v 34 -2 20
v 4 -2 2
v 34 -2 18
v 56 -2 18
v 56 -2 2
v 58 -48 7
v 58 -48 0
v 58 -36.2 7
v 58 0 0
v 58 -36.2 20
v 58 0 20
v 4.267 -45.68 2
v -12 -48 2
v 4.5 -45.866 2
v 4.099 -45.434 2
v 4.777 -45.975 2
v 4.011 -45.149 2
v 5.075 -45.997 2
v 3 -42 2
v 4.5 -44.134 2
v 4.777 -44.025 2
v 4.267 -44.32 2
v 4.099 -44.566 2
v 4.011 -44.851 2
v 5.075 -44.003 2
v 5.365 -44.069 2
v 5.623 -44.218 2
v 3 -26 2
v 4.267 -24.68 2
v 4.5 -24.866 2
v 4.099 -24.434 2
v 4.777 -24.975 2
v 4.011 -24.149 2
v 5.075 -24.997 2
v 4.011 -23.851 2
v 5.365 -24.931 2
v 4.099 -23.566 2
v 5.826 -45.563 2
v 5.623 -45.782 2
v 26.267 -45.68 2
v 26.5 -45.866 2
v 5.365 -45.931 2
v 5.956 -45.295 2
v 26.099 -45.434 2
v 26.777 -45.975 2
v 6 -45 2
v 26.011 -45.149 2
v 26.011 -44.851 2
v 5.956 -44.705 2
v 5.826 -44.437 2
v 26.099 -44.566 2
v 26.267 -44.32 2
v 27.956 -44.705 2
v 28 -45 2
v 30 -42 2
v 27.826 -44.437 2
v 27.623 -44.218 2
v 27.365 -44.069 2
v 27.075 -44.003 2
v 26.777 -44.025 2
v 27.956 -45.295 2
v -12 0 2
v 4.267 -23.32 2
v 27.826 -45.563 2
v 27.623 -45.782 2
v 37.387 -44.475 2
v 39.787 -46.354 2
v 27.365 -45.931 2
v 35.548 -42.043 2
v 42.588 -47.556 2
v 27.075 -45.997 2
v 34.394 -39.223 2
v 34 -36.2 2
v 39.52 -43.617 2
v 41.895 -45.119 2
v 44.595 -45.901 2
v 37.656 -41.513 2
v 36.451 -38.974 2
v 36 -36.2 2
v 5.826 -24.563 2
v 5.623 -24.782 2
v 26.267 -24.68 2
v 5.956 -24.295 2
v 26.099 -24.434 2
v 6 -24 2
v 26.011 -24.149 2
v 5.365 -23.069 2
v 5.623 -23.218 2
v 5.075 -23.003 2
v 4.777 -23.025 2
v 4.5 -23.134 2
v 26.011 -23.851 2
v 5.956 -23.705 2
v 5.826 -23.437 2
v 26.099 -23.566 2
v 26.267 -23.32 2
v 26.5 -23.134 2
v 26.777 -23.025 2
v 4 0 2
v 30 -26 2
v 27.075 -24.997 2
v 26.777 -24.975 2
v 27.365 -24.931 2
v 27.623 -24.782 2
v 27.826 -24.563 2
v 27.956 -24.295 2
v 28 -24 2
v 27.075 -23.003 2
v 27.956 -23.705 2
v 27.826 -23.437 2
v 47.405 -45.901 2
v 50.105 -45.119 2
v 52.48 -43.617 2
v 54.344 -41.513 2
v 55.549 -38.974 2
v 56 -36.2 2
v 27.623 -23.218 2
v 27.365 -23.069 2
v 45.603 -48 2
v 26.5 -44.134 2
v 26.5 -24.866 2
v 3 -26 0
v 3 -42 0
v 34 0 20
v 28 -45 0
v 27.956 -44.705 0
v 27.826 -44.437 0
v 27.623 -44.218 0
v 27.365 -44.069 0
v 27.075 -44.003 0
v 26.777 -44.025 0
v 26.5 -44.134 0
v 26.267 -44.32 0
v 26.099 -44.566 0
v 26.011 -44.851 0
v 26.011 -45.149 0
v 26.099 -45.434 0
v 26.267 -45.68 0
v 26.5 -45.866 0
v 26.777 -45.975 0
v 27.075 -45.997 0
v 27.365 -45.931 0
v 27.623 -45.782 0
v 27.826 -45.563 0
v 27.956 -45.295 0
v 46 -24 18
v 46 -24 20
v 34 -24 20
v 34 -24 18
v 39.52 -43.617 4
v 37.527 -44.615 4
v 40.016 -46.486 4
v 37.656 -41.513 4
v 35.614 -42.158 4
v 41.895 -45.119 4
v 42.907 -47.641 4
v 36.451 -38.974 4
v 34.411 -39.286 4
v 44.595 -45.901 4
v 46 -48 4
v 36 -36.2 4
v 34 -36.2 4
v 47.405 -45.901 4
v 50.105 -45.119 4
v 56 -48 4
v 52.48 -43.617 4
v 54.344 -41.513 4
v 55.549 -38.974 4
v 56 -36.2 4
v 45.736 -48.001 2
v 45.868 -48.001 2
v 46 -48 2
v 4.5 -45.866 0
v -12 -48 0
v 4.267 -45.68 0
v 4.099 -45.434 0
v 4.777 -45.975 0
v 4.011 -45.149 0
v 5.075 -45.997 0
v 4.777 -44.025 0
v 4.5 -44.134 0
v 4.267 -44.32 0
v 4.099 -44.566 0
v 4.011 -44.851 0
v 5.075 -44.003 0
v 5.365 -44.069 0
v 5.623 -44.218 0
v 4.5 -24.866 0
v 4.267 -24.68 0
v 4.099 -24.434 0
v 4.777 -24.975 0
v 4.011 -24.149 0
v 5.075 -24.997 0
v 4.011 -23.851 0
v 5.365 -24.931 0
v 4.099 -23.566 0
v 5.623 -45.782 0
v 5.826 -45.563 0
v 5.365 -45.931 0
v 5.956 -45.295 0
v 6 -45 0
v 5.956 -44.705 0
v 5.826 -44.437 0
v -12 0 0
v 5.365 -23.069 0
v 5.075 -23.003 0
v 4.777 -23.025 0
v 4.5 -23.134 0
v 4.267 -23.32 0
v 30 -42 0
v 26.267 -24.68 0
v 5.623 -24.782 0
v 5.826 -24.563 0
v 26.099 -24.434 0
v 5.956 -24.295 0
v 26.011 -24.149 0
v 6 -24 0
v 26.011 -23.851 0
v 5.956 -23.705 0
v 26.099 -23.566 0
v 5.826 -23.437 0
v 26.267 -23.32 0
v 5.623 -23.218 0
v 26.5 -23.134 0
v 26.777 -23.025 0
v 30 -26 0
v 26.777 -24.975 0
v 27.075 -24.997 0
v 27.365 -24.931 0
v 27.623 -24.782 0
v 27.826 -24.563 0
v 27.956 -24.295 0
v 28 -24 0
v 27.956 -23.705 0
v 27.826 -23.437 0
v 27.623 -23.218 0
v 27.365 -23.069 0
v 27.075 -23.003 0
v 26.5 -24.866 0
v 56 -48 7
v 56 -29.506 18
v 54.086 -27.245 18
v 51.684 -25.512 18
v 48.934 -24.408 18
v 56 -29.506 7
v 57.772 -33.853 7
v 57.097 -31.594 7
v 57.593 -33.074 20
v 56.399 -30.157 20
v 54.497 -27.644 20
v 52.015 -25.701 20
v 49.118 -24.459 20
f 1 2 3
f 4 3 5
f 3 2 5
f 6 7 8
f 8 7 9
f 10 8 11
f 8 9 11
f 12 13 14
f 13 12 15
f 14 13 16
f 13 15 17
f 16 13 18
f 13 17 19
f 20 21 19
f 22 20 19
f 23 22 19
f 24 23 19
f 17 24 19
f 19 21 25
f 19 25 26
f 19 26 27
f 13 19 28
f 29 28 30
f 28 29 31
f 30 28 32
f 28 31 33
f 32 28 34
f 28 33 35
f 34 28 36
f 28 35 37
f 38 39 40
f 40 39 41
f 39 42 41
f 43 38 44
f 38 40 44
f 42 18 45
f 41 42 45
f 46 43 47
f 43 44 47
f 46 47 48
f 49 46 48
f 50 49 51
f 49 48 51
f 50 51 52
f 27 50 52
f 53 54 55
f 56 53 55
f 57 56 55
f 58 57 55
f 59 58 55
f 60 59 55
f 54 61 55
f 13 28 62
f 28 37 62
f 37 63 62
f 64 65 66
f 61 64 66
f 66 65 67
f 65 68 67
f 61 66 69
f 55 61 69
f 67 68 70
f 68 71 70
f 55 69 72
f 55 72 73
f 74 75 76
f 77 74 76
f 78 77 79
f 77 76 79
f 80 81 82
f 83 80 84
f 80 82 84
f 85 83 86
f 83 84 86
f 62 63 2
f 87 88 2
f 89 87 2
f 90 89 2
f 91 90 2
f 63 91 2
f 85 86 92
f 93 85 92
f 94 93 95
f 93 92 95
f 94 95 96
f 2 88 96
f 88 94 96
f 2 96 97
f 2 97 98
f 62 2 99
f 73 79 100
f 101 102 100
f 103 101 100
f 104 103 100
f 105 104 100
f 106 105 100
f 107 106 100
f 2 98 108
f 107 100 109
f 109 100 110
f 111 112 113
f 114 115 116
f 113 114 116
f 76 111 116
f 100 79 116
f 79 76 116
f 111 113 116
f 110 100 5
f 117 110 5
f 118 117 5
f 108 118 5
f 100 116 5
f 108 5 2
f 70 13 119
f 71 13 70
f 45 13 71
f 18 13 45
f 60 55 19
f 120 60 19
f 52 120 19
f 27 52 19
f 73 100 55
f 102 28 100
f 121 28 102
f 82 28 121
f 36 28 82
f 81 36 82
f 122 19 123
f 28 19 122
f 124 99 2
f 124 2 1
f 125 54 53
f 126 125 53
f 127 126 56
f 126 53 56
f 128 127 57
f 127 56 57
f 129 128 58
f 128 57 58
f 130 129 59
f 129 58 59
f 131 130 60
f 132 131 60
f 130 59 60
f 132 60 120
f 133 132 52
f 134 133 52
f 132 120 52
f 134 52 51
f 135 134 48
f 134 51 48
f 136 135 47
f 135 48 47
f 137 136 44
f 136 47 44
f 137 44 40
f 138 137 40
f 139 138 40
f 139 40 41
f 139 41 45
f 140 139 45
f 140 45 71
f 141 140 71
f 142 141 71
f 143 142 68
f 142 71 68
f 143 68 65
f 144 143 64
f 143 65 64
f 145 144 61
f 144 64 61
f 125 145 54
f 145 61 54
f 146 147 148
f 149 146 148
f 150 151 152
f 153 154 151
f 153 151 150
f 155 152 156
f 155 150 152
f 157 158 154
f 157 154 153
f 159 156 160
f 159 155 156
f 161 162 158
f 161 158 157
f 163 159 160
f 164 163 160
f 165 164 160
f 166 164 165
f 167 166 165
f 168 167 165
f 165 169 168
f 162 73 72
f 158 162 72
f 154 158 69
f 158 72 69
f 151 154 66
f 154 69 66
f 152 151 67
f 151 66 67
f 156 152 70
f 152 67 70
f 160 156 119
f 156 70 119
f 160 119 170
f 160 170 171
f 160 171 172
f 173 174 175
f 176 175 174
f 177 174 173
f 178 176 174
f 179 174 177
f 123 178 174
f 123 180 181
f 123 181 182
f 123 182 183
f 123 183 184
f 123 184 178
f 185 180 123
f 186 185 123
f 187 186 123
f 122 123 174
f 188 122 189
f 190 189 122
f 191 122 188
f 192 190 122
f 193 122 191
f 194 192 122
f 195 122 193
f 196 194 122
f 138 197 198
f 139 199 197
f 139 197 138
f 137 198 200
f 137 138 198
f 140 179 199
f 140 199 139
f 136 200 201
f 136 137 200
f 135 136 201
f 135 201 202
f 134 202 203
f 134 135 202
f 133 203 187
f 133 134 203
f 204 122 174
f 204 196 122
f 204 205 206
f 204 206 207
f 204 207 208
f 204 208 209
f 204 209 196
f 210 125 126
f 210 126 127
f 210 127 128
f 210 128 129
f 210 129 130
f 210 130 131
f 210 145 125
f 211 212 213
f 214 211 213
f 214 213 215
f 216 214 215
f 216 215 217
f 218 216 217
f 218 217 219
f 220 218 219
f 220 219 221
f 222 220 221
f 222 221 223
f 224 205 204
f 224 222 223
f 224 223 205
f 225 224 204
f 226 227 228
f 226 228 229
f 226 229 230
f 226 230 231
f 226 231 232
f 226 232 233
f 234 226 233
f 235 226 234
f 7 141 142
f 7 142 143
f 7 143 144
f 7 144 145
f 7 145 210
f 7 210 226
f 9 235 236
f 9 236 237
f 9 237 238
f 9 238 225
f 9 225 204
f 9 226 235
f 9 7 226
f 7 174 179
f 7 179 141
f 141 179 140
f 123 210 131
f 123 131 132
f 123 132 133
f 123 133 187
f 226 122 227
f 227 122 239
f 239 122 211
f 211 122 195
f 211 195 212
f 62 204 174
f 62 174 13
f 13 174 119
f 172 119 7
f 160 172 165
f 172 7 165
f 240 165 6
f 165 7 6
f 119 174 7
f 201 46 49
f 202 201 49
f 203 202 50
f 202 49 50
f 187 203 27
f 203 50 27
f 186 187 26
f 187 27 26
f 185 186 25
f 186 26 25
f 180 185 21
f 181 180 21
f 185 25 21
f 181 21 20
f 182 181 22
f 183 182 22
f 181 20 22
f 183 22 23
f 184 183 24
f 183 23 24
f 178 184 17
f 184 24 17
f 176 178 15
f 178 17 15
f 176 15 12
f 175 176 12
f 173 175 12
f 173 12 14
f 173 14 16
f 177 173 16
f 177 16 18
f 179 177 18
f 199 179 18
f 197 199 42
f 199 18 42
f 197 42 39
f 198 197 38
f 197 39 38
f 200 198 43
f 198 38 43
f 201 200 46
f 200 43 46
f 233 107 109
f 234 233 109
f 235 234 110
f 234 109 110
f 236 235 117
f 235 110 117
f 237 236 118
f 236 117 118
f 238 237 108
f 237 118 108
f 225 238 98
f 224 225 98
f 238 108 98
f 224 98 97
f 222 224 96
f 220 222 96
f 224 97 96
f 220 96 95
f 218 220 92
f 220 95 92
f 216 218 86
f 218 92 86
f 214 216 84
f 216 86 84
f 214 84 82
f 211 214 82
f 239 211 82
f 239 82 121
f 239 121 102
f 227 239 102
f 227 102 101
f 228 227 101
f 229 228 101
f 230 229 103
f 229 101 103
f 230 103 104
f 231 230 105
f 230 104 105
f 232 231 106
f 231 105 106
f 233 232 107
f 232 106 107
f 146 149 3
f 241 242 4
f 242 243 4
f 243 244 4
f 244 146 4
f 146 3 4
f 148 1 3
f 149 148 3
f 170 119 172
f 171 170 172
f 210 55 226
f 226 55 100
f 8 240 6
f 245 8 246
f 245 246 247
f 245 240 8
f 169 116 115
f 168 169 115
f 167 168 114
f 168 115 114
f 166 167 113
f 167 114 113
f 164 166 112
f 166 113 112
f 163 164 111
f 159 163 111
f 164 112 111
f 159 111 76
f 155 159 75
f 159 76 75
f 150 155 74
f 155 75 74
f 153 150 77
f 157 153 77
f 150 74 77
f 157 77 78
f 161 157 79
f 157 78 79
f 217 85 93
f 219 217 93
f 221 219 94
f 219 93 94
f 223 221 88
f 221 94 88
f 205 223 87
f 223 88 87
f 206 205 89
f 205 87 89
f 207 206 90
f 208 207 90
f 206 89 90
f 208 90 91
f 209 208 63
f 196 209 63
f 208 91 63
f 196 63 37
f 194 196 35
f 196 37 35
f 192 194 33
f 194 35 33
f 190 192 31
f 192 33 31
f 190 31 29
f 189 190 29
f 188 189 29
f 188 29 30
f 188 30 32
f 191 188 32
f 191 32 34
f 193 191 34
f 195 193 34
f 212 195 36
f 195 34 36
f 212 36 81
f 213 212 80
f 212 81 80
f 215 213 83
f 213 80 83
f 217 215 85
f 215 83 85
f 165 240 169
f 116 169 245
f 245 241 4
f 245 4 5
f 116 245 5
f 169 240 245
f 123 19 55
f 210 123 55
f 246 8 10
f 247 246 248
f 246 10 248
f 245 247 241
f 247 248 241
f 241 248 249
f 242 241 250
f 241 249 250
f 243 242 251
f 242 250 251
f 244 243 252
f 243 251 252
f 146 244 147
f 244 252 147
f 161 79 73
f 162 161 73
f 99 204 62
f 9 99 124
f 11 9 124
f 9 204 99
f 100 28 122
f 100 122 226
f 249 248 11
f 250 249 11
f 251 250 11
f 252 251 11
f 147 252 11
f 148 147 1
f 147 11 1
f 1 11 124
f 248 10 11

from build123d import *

# Parameters (mm, degrees)
SKETCH1_W           = 58
SKETCH1_H           = 48
BOSS_EXTRUDE1_DEPTH = 2
SKETCH2_R           = 1
SKETCH2_W           = 27
SKETCH2_H           = 16
CUT_EXTRUDE1_DEPTH  = 2
SKETCH3_W           = 54
SKETCH3_H           = 2
BOSS_EXTRUDE2_DEPTH = 18
CUT_EXTRUDE2_DEPTH  = 2
BOSS_EXTRUDE3_DEPTH = 46
BOSS_EXTRUDE4_DEPTH = 2
CUT_EXTRUDE3_DEPTH  = 13
SKETCH8_W           = 2
SKETCH8_H           = 48
BOSS_EXTRUDE5_DEPTH = 12


with BuildPart() as part:
    # Sketch1 → Boss-Extrude1 (new body)
    with BuildSketch(Plane.XY):
        with Locations((29, -24)):
            Rectangle(SKETCH1_W, SKETCH1_H)
    extrude(amount=BOSS_EXTRUDE1_DEPTH)

    # Sketch2 → Cut-Extrude1 (cut)
    with BuildSketch(Plane.XY.offset(2)):
        with Locations((5, -45)):
            Circle(SKETCH2_R)
        with Locations((27, -45)):
            Circle(SKETCH2_R)
        with Locations((5, -24)):
            Circle(SKETCH2_R)
        with Locations((27, -24)):
            Circle(SKETCH2_R)
        with Locations((16.5, -34)):
            Rectangle(SKETCH2_W, SKETCH2_H)
    extrude(amount=-CUT_EXTRUDE1_DEPTH, mode=Mode.SUBTRACT)

    # Sketch3 → Boss-Extrude2 (add)
    with BuildSketch(Plane.XY.offset(2)):
        with Locations((31, -1)):
            Rectangle(SKETCH3_W, SKETCH3_H)
    extrude(amount=BOSS_EXTRUDE2_DEPTH)

    # Sketch4 → Cut-Extrude2 (cut)
    with BuildSketch(Plane(origin=(0, 0, 0), x_dir=(1, 0, 0), z_dir=(0, 1, 0))):
        Polygon((4, -2), (34, -20), (4, -20), align=None)
    extrude(amount=-CUT_EXTRUDE2_DEPTH, mode=Mode.SUBTRACT)

    # Sketch5 → Boss-Extrude3 (add)
    with BuildSketch(Plane.XZ.offset(2)):
        Polygon((58, 20), (34, 20), (34, 18), (56, 18), (56, 2), (58, 2), (58, 18), align=None)
    extrude(amount=BOSS_EXTRUDE3_DEPTH)

    # Sketch6 → Boss-Extrude4 (add)
    with BuildSketch(Plane.XY.offset(2)):
        with BuildLine():
            Line((36, -36.2), (34, -36.2))
            ThreePointArc((34, -36.2), (37.527046669, -44.614867795), (46, -48))
            Line((46, -48), (57, -48))
            Line((57, -48), (57, -36.2))
            Line((57, -36.2), (56, -36.2))
            ThreePointArc((56, -36.2), (46, -46), (36, -36.2))
        make_face()
    extrude(amount=BOSS_EXTRUDE4_DEPTH)

    # Sketch7 → Cut-Extrude3 (cut)
    with BuildSketch(Plane.XY.offset(20)):
        with BuildLine():
            Line((58, -48), (58, -36.2))
            ThreePointArc((58, -36.2), (54.497222311, -27.64371576), (46, -24))
            Line((46, -24), (34, -24))
            Line((34, -24), (34, -48))
            Line((34, -48), (58, -48))
        make_face()
    extrude(amount=-CUT_EXTRUDE3_DEPTH, mode=Mode.SUBTRACT)

    # Sketch8 → Boss-Extrude5 (add)
    with BuildSketch(Plane.ZY):
        with Locations((1, -24)):
            Rectangle(SKETCH8_W, SKETCH8_H)
    extrude(amount=BOSS_EXTRUDE5_DEPTH)


solid = part.part
